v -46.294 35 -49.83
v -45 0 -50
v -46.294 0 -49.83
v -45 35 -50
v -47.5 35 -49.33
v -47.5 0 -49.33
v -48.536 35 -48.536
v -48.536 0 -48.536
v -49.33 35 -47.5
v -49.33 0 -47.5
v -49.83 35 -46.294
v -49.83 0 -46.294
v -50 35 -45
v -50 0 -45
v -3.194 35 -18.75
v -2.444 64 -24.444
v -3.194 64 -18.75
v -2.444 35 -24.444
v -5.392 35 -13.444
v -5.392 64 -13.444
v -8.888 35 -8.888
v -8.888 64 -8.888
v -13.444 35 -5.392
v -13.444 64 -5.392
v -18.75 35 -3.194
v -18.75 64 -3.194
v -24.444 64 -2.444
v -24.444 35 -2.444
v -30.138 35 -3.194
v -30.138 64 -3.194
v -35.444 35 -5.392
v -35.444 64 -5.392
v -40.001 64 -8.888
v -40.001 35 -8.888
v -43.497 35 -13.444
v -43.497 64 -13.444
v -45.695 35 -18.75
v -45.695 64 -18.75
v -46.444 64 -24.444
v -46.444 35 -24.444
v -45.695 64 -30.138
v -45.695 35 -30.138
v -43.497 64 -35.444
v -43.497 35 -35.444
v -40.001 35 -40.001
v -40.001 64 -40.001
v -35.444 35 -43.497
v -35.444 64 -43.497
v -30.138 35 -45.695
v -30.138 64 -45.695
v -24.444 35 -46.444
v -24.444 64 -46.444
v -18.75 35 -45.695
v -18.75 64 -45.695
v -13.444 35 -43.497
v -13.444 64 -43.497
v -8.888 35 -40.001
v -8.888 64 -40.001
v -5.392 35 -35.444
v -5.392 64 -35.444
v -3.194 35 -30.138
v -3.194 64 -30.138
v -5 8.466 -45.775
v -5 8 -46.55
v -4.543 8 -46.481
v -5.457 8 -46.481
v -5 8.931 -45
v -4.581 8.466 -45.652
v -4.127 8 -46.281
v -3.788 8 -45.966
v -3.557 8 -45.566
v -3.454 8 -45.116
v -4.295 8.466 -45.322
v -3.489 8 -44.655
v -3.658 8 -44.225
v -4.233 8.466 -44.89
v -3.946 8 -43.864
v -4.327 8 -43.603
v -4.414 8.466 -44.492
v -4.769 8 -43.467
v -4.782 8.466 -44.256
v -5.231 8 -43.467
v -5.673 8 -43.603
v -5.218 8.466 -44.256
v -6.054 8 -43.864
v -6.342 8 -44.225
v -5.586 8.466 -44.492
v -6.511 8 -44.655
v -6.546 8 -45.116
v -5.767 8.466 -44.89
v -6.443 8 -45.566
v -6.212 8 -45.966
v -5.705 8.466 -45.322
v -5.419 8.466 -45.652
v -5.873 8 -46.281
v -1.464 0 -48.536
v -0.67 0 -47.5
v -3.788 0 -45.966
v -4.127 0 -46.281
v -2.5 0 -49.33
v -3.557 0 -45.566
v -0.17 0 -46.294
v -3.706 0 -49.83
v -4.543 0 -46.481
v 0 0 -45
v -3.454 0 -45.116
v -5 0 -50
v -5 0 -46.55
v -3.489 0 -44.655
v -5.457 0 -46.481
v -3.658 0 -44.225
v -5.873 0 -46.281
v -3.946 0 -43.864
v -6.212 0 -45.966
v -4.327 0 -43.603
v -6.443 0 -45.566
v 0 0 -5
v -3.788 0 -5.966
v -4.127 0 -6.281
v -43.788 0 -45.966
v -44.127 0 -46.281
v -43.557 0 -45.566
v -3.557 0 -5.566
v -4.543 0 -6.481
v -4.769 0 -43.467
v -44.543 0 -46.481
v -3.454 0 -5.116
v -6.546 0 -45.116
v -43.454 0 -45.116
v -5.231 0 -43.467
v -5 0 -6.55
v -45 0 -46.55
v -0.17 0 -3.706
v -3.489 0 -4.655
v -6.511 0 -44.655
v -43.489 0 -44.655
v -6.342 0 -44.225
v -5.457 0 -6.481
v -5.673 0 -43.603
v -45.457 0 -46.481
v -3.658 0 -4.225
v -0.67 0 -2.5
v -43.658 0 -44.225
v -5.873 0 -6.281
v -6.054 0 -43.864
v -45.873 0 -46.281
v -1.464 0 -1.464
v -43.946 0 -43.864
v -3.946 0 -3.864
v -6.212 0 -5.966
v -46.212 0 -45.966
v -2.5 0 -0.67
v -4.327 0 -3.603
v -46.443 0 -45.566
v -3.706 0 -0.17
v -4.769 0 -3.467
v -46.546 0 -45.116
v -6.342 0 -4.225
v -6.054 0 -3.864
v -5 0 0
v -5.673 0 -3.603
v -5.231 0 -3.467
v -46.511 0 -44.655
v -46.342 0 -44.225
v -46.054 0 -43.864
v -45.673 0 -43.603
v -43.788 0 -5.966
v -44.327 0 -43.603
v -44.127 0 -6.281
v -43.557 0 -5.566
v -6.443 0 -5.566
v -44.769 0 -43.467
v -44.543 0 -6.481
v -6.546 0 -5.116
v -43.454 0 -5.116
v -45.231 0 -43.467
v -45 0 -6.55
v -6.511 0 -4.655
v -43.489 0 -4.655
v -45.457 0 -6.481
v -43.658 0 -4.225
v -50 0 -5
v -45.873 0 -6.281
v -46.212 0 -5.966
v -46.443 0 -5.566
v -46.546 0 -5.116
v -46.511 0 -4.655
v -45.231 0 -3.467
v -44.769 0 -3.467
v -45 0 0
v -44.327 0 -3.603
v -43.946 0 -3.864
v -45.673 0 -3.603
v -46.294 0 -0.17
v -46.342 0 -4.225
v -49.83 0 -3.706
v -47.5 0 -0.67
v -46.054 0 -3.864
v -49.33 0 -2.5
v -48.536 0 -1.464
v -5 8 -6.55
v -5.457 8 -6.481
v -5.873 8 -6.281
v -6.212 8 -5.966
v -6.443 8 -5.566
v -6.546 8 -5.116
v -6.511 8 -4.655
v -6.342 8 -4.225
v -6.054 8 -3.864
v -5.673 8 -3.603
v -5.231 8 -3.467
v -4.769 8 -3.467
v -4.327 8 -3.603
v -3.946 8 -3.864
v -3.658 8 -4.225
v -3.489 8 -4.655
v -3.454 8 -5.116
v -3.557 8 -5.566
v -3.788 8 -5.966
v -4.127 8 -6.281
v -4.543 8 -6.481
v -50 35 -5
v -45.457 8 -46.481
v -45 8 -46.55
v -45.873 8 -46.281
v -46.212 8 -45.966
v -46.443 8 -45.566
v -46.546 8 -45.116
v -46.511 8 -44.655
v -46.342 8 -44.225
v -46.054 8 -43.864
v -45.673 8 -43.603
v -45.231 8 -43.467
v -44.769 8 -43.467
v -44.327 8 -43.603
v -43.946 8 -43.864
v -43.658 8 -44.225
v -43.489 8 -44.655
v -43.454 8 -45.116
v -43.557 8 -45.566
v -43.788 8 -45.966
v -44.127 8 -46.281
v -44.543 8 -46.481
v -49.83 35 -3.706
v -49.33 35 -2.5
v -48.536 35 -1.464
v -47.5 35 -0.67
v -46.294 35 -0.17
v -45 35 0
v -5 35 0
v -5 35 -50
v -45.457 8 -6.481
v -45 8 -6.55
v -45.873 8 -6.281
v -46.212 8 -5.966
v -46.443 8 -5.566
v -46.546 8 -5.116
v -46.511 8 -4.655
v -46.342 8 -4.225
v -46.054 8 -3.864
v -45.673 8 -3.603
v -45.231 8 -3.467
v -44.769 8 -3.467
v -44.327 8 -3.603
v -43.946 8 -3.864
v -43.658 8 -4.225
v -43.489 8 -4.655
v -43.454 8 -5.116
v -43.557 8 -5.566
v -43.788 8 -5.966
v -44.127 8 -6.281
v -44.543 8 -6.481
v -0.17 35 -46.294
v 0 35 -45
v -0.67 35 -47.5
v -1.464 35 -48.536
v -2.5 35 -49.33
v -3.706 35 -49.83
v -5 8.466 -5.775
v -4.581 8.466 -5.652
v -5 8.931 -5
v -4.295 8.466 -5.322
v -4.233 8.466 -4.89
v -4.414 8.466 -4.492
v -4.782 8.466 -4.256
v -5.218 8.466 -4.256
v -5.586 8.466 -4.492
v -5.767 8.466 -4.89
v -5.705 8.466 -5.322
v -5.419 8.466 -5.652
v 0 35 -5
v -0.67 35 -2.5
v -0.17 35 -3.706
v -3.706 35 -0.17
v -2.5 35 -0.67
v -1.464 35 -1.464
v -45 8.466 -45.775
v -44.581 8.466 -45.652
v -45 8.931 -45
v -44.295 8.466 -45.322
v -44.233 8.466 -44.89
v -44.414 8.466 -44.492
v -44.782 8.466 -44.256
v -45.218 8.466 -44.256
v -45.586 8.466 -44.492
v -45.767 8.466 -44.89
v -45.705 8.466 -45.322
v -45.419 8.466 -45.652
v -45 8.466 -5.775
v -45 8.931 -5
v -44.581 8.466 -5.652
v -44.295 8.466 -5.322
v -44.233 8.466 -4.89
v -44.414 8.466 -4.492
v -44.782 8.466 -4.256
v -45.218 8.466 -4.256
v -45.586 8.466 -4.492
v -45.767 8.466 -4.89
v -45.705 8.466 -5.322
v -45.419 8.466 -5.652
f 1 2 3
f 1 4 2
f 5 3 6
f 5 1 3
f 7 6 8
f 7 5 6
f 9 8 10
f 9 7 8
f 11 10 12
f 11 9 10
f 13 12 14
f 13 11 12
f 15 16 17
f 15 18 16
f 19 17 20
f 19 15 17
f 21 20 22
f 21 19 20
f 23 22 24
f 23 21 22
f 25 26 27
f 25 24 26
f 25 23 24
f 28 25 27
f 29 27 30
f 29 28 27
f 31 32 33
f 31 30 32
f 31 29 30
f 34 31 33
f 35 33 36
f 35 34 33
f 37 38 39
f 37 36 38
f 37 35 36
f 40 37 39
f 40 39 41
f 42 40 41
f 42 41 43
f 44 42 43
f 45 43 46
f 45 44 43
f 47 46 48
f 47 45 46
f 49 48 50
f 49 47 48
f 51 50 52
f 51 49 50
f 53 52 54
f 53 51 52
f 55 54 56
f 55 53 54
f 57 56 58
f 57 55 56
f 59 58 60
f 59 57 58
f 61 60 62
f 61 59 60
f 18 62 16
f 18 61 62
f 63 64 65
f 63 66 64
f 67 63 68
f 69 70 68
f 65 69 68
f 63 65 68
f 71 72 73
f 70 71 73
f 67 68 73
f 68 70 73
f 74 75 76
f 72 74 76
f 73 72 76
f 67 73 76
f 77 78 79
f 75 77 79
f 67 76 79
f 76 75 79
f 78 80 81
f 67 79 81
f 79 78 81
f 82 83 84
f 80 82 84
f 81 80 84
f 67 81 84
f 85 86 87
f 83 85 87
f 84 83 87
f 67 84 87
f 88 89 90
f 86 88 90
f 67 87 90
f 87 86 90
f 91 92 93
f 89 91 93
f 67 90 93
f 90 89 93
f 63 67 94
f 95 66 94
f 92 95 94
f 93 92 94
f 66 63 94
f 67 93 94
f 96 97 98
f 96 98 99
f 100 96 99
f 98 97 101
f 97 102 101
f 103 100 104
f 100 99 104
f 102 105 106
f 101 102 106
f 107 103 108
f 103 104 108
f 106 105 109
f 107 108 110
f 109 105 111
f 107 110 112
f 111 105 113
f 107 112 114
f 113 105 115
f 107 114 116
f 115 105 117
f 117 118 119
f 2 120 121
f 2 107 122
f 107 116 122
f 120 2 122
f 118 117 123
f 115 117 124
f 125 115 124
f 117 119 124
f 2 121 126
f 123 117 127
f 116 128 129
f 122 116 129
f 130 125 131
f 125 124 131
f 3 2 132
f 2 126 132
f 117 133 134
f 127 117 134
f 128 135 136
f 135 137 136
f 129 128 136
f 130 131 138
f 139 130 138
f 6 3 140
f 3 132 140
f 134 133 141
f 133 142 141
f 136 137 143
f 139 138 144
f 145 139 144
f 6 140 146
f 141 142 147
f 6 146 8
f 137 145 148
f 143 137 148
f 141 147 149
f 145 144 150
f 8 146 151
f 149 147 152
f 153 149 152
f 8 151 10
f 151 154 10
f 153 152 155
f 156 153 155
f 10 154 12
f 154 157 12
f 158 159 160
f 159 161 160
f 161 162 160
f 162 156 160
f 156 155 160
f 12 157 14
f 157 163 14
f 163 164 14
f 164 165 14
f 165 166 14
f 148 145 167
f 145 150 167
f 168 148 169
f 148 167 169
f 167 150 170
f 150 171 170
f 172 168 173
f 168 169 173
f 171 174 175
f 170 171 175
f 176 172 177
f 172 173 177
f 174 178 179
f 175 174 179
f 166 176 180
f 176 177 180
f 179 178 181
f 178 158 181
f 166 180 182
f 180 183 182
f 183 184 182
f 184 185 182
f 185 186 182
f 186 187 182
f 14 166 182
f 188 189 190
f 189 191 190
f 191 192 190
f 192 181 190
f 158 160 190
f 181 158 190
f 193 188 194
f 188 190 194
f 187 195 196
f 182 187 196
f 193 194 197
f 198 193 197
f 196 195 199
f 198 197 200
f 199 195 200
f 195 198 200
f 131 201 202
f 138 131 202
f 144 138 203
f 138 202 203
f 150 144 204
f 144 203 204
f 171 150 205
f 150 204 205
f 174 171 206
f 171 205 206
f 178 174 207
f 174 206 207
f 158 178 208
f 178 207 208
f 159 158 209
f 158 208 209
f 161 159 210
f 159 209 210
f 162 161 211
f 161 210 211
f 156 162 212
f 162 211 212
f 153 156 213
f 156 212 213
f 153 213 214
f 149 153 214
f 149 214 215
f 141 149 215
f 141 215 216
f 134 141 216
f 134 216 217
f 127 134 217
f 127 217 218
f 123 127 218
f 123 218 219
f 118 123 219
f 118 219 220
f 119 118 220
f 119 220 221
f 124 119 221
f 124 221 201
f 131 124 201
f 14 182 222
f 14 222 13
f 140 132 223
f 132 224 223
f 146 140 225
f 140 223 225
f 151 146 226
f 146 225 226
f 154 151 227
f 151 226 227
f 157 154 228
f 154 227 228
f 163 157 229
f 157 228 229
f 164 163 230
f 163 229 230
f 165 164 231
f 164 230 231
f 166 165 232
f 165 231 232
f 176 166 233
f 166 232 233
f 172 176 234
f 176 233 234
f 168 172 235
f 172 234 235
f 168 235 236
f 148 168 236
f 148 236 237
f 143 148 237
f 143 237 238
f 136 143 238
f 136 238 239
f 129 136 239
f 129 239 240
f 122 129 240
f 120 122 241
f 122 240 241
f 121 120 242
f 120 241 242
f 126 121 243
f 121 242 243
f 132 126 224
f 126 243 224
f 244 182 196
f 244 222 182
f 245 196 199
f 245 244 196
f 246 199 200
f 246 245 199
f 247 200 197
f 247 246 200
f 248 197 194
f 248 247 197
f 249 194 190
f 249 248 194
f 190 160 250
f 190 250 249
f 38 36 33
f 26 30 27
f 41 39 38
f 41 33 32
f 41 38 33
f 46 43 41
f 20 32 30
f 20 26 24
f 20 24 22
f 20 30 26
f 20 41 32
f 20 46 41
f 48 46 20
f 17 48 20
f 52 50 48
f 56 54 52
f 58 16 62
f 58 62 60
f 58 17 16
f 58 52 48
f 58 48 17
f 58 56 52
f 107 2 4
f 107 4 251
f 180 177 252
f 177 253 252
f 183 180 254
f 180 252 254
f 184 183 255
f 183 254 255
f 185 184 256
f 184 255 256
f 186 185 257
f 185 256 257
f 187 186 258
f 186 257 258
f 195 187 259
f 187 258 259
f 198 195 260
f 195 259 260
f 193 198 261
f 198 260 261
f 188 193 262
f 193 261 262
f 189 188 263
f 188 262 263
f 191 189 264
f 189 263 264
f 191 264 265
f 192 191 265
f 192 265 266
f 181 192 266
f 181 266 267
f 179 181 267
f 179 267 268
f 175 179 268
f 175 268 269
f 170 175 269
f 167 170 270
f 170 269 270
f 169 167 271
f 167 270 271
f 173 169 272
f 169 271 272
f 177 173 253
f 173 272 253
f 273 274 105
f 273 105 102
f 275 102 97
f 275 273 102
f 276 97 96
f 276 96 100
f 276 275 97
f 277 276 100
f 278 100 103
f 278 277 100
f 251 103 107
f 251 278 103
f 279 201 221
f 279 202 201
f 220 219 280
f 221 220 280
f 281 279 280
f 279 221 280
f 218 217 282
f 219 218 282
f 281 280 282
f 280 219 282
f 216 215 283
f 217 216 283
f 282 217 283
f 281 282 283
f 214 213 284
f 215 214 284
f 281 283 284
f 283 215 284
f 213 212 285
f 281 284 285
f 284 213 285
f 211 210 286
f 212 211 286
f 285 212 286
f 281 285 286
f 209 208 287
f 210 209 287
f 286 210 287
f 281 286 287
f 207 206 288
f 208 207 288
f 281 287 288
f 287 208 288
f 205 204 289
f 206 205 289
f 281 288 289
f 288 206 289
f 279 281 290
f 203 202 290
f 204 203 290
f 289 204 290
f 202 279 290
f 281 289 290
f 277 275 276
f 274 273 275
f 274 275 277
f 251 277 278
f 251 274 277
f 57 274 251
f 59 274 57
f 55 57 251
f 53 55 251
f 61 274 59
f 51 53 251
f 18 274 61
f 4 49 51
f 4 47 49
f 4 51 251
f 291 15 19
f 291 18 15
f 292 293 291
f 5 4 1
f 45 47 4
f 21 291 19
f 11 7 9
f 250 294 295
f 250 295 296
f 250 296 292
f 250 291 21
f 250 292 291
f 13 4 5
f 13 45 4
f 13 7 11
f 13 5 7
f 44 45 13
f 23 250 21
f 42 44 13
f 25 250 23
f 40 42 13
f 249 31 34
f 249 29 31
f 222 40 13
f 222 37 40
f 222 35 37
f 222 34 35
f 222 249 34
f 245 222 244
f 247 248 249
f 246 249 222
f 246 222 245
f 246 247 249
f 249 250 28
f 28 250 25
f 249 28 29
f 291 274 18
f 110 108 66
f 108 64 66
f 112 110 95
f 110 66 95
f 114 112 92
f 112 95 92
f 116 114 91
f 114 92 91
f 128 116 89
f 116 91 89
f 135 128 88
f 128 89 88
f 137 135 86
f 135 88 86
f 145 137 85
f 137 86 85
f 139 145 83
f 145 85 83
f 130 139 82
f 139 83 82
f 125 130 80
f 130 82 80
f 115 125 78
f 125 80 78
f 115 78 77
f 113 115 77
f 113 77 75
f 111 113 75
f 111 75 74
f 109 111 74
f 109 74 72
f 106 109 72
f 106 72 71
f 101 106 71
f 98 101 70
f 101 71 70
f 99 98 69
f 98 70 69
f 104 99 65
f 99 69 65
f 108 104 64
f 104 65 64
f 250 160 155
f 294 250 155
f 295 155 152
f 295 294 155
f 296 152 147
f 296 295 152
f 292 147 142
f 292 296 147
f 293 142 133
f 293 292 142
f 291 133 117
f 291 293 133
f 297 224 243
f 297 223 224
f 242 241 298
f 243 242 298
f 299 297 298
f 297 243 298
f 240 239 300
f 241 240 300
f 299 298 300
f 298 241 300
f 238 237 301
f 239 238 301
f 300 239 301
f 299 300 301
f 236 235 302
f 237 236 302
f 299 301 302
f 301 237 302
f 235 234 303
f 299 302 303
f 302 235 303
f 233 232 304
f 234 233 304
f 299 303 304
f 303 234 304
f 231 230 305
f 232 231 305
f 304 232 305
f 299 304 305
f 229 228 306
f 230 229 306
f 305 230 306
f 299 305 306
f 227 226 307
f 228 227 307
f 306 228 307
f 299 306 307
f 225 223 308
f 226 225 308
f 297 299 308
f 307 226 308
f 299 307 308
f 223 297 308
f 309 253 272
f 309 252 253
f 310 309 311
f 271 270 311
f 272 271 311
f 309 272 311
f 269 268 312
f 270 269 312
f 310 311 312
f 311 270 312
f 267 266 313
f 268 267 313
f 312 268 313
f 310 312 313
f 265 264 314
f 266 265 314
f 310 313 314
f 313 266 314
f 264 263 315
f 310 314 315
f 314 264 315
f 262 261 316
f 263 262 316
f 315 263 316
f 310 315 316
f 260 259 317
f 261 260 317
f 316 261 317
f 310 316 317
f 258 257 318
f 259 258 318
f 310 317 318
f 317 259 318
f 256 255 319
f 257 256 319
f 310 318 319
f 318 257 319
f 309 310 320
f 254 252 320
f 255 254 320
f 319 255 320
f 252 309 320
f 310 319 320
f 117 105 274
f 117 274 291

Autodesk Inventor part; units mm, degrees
ref_plane "YZ Plane" through (0, 0, 0) normal (1, 0, 0) x (0, 1, 0)
ref_plane "XZ Plane" through (0, 0, 0) normal (0, 1, 0) x (-1, 0, 0)
ref_plane "XY Plane" through (0, 0, 0) normal (0, 0, 1) x (1, 0, 0)
sketch "スケッチ1" plane through (0, 0, 0) normal (0, 1, 0) x (-1, 0, 0)
  line L0 (0, 0) -> (50, 0)
  line L1 (50, 0) -> (50, -50)
  line L2 (50, -50) -> (0, -50)
  line L3 (0, -50) -> (0, 0)
  dimension "d0" = 50
  dimension "d1" = 50
extrude "押し出し1" add sketch "スケッチ1" along normal blind 35
sketch "スケッチ2" plane through (0, 35, 0) normal (0, 1, 0) x (1, 0, 0)
  circle A0 centre (-24.4444, 24.4444) radius 22
  point P0 (0, 0)
  dimension "d4" = 44
extrude "押し出し2" add sketch "スケッチ2" along normal blind 29
fillet "フィレット1" radius 5 4 edges at (-50, 17.5, 0) (0, 17.5, 0) (0, 17.5, -50) (-50, 17.5, -50)
sketch "スケッチ3" plane through (0, 0, 0) normal (0, -1, 0) x (1, 0, 0)
  arc A0 (-50, -45) -> (-45, -50) centre (-45, -45) ccw projected
  line L0 (-5, -50) -> (-45, -50) projected
  arc A1 (-5, -50) -> (0, -45) centre (-5, -45) ccw projected
  line L1 (0, -5) -> (0, -45) projected
  arc A2 (0, -5) -> (-5, 0) centre (-5, -5) ccw projected
  line L2 (-45, 0) -> (-5, 0) projected
  arc A3 (-45, 0) -> (-50, -5) centre (-45, -5) ccw projected
  line L3 (-50, -45) -> (-50, -5) projected
  point P0 (0, 0)
hole "穴1" at (-5, 0, -5) at (-5, 0, -45) at (-45, 0, -45) at (-45, 0, -5) direction (0, 1, 0) diameter 3.1 depth 8 tip angle 118
properties part number "LiDAR_un" material "ABS プラスチック"
